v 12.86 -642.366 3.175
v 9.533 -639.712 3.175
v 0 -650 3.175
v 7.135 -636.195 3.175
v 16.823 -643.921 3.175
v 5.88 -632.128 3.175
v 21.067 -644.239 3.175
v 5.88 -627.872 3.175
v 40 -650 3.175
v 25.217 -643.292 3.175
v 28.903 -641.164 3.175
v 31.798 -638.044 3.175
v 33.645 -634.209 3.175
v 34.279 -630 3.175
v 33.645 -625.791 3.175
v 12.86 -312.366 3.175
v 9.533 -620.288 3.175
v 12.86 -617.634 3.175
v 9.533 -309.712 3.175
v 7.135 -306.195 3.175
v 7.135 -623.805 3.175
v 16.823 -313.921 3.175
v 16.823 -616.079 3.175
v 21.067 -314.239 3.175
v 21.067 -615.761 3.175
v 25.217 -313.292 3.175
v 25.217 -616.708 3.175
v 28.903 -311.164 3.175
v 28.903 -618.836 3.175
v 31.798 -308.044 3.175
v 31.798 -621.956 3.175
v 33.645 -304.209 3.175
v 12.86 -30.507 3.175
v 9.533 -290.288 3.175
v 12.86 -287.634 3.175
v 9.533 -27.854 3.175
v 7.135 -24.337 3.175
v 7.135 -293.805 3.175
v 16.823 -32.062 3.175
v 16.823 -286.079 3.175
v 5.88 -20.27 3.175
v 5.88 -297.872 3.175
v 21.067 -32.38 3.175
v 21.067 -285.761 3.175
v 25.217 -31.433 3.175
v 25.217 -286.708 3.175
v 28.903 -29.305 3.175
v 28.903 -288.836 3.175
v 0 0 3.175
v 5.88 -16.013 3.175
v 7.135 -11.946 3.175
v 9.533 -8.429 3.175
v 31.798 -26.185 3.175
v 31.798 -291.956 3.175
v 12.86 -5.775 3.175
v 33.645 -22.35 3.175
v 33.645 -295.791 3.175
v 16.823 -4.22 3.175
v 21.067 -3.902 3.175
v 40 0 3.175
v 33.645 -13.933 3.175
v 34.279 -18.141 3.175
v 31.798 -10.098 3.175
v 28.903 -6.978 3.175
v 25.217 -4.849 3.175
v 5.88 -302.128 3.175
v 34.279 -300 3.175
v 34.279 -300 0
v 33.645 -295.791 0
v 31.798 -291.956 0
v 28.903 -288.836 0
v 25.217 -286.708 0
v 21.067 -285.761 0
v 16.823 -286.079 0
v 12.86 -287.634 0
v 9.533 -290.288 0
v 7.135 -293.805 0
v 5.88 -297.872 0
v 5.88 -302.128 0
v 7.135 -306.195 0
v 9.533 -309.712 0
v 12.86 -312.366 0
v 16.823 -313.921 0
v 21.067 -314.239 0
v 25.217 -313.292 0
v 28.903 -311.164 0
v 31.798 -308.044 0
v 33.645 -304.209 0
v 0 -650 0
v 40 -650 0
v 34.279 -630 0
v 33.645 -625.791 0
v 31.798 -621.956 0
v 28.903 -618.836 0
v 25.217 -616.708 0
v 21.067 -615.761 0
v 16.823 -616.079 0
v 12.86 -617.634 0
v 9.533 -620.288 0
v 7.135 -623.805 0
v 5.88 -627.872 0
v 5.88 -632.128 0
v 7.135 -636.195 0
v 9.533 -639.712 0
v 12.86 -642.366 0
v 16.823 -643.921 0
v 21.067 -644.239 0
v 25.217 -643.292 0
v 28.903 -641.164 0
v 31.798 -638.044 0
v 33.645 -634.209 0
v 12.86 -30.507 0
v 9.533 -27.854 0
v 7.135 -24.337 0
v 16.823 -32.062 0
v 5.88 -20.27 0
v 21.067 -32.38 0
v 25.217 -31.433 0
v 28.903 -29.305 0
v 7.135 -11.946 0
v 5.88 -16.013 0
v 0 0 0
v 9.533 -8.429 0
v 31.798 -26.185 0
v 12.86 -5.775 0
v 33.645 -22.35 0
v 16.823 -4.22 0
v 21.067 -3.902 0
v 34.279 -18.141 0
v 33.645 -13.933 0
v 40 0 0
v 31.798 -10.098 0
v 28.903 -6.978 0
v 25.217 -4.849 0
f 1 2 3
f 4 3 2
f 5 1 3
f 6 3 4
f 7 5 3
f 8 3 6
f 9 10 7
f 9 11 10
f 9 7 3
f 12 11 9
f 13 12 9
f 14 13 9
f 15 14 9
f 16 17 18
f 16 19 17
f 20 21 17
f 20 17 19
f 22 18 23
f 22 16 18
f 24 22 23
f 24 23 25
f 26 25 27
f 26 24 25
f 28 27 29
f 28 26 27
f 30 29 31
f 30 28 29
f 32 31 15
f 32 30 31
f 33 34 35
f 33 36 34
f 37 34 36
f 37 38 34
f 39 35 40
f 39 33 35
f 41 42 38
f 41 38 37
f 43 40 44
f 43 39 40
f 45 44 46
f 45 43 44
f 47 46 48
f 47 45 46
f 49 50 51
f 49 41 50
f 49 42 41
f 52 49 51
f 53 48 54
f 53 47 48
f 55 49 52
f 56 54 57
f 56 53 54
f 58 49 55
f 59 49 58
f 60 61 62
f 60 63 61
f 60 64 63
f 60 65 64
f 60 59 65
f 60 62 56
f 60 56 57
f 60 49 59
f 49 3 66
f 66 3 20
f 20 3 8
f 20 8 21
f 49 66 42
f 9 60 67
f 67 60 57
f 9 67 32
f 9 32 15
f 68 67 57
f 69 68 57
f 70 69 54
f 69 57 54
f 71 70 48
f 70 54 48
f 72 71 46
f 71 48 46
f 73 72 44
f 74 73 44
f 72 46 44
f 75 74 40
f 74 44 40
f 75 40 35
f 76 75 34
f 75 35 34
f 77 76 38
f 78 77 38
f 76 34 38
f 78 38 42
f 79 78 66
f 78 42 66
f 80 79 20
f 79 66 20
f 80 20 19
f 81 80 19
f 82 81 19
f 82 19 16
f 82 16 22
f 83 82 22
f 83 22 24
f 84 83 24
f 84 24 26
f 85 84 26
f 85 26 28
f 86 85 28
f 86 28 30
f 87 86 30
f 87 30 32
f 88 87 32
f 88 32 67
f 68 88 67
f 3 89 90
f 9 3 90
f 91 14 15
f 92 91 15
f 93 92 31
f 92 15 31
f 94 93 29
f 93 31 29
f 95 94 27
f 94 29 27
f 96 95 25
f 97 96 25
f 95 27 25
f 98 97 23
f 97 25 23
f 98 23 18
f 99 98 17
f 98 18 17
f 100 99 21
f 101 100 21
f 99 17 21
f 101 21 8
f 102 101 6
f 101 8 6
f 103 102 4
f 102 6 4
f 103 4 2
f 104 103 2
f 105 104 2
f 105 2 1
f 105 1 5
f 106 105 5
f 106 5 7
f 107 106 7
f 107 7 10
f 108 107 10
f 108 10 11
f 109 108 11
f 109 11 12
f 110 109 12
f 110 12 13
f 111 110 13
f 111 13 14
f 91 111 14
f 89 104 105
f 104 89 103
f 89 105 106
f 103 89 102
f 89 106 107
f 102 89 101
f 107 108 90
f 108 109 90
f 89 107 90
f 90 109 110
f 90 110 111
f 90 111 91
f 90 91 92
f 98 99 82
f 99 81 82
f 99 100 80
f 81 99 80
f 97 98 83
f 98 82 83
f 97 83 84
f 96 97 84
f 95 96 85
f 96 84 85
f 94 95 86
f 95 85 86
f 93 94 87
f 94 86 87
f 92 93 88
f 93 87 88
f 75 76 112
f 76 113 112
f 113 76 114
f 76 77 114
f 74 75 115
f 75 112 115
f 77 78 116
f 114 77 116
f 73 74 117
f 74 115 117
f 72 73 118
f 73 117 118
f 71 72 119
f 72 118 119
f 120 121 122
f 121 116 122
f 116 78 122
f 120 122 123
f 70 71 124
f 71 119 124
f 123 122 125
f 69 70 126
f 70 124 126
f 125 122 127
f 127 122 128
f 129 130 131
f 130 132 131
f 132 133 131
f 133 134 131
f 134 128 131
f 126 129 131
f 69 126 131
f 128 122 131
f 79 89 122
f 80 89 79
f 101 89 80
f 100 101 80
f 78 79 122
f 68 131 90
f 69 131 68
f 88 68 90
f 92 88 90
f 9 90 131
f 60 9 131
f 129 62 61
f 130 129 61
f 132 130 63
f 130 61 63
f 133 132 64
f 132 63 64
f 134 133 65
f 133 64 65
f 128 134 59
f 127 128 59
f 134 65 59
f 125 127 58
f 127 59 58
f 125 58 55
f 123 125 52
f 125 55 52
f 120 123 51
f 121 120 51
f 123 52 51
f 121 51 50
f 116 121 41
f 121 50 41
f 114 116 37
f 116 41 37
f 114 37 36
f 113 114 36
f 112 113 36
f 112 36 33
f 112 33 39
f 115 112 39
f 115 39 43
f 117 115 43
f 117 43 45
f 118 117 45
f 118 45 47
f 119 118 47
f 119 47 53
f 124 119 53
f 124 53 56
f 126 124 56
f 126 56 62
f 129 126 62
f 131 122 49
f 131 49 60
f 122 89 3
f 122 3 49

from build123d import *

# Parameters (mm, degrees)
SKETCH1_W           = 40
SKETCH1_H           = 650
BOSS_EXTRUDE1_DEPTH = 3.175
SKETCH2_R           = 14.279
CUT_EXTRUDE1_DEPTH  = 4.175


with BuildPart() as part:
    # Sketch1 → Boss-Extrude1 (new body)
    with BuildSketch(Plane.XY):
        with Locations((20, -325)):
            Rectangle(SKETCH1_W, SKETCH1_H)
    extrude(amount=BOSS_EXTRUDE1_DEPTH)

    # Sketch2 → Cut-Extrude1 (cut, through all)
    with BuildSketch(Plane.XY.offset(3.175)):
        with Locations((20, -18.141364063)):
            Circle(SKETCH2_R)
        with Locations((20, -630)):
            Circle(SKETCH2_R)
        with Locations((20, -300)):
            Circle(SKETCH2_R)
    extrude(amount=-CUT_EXTRUDE1_DEPTH, mode=Mode.SUBTRACT)


solid = part.part
